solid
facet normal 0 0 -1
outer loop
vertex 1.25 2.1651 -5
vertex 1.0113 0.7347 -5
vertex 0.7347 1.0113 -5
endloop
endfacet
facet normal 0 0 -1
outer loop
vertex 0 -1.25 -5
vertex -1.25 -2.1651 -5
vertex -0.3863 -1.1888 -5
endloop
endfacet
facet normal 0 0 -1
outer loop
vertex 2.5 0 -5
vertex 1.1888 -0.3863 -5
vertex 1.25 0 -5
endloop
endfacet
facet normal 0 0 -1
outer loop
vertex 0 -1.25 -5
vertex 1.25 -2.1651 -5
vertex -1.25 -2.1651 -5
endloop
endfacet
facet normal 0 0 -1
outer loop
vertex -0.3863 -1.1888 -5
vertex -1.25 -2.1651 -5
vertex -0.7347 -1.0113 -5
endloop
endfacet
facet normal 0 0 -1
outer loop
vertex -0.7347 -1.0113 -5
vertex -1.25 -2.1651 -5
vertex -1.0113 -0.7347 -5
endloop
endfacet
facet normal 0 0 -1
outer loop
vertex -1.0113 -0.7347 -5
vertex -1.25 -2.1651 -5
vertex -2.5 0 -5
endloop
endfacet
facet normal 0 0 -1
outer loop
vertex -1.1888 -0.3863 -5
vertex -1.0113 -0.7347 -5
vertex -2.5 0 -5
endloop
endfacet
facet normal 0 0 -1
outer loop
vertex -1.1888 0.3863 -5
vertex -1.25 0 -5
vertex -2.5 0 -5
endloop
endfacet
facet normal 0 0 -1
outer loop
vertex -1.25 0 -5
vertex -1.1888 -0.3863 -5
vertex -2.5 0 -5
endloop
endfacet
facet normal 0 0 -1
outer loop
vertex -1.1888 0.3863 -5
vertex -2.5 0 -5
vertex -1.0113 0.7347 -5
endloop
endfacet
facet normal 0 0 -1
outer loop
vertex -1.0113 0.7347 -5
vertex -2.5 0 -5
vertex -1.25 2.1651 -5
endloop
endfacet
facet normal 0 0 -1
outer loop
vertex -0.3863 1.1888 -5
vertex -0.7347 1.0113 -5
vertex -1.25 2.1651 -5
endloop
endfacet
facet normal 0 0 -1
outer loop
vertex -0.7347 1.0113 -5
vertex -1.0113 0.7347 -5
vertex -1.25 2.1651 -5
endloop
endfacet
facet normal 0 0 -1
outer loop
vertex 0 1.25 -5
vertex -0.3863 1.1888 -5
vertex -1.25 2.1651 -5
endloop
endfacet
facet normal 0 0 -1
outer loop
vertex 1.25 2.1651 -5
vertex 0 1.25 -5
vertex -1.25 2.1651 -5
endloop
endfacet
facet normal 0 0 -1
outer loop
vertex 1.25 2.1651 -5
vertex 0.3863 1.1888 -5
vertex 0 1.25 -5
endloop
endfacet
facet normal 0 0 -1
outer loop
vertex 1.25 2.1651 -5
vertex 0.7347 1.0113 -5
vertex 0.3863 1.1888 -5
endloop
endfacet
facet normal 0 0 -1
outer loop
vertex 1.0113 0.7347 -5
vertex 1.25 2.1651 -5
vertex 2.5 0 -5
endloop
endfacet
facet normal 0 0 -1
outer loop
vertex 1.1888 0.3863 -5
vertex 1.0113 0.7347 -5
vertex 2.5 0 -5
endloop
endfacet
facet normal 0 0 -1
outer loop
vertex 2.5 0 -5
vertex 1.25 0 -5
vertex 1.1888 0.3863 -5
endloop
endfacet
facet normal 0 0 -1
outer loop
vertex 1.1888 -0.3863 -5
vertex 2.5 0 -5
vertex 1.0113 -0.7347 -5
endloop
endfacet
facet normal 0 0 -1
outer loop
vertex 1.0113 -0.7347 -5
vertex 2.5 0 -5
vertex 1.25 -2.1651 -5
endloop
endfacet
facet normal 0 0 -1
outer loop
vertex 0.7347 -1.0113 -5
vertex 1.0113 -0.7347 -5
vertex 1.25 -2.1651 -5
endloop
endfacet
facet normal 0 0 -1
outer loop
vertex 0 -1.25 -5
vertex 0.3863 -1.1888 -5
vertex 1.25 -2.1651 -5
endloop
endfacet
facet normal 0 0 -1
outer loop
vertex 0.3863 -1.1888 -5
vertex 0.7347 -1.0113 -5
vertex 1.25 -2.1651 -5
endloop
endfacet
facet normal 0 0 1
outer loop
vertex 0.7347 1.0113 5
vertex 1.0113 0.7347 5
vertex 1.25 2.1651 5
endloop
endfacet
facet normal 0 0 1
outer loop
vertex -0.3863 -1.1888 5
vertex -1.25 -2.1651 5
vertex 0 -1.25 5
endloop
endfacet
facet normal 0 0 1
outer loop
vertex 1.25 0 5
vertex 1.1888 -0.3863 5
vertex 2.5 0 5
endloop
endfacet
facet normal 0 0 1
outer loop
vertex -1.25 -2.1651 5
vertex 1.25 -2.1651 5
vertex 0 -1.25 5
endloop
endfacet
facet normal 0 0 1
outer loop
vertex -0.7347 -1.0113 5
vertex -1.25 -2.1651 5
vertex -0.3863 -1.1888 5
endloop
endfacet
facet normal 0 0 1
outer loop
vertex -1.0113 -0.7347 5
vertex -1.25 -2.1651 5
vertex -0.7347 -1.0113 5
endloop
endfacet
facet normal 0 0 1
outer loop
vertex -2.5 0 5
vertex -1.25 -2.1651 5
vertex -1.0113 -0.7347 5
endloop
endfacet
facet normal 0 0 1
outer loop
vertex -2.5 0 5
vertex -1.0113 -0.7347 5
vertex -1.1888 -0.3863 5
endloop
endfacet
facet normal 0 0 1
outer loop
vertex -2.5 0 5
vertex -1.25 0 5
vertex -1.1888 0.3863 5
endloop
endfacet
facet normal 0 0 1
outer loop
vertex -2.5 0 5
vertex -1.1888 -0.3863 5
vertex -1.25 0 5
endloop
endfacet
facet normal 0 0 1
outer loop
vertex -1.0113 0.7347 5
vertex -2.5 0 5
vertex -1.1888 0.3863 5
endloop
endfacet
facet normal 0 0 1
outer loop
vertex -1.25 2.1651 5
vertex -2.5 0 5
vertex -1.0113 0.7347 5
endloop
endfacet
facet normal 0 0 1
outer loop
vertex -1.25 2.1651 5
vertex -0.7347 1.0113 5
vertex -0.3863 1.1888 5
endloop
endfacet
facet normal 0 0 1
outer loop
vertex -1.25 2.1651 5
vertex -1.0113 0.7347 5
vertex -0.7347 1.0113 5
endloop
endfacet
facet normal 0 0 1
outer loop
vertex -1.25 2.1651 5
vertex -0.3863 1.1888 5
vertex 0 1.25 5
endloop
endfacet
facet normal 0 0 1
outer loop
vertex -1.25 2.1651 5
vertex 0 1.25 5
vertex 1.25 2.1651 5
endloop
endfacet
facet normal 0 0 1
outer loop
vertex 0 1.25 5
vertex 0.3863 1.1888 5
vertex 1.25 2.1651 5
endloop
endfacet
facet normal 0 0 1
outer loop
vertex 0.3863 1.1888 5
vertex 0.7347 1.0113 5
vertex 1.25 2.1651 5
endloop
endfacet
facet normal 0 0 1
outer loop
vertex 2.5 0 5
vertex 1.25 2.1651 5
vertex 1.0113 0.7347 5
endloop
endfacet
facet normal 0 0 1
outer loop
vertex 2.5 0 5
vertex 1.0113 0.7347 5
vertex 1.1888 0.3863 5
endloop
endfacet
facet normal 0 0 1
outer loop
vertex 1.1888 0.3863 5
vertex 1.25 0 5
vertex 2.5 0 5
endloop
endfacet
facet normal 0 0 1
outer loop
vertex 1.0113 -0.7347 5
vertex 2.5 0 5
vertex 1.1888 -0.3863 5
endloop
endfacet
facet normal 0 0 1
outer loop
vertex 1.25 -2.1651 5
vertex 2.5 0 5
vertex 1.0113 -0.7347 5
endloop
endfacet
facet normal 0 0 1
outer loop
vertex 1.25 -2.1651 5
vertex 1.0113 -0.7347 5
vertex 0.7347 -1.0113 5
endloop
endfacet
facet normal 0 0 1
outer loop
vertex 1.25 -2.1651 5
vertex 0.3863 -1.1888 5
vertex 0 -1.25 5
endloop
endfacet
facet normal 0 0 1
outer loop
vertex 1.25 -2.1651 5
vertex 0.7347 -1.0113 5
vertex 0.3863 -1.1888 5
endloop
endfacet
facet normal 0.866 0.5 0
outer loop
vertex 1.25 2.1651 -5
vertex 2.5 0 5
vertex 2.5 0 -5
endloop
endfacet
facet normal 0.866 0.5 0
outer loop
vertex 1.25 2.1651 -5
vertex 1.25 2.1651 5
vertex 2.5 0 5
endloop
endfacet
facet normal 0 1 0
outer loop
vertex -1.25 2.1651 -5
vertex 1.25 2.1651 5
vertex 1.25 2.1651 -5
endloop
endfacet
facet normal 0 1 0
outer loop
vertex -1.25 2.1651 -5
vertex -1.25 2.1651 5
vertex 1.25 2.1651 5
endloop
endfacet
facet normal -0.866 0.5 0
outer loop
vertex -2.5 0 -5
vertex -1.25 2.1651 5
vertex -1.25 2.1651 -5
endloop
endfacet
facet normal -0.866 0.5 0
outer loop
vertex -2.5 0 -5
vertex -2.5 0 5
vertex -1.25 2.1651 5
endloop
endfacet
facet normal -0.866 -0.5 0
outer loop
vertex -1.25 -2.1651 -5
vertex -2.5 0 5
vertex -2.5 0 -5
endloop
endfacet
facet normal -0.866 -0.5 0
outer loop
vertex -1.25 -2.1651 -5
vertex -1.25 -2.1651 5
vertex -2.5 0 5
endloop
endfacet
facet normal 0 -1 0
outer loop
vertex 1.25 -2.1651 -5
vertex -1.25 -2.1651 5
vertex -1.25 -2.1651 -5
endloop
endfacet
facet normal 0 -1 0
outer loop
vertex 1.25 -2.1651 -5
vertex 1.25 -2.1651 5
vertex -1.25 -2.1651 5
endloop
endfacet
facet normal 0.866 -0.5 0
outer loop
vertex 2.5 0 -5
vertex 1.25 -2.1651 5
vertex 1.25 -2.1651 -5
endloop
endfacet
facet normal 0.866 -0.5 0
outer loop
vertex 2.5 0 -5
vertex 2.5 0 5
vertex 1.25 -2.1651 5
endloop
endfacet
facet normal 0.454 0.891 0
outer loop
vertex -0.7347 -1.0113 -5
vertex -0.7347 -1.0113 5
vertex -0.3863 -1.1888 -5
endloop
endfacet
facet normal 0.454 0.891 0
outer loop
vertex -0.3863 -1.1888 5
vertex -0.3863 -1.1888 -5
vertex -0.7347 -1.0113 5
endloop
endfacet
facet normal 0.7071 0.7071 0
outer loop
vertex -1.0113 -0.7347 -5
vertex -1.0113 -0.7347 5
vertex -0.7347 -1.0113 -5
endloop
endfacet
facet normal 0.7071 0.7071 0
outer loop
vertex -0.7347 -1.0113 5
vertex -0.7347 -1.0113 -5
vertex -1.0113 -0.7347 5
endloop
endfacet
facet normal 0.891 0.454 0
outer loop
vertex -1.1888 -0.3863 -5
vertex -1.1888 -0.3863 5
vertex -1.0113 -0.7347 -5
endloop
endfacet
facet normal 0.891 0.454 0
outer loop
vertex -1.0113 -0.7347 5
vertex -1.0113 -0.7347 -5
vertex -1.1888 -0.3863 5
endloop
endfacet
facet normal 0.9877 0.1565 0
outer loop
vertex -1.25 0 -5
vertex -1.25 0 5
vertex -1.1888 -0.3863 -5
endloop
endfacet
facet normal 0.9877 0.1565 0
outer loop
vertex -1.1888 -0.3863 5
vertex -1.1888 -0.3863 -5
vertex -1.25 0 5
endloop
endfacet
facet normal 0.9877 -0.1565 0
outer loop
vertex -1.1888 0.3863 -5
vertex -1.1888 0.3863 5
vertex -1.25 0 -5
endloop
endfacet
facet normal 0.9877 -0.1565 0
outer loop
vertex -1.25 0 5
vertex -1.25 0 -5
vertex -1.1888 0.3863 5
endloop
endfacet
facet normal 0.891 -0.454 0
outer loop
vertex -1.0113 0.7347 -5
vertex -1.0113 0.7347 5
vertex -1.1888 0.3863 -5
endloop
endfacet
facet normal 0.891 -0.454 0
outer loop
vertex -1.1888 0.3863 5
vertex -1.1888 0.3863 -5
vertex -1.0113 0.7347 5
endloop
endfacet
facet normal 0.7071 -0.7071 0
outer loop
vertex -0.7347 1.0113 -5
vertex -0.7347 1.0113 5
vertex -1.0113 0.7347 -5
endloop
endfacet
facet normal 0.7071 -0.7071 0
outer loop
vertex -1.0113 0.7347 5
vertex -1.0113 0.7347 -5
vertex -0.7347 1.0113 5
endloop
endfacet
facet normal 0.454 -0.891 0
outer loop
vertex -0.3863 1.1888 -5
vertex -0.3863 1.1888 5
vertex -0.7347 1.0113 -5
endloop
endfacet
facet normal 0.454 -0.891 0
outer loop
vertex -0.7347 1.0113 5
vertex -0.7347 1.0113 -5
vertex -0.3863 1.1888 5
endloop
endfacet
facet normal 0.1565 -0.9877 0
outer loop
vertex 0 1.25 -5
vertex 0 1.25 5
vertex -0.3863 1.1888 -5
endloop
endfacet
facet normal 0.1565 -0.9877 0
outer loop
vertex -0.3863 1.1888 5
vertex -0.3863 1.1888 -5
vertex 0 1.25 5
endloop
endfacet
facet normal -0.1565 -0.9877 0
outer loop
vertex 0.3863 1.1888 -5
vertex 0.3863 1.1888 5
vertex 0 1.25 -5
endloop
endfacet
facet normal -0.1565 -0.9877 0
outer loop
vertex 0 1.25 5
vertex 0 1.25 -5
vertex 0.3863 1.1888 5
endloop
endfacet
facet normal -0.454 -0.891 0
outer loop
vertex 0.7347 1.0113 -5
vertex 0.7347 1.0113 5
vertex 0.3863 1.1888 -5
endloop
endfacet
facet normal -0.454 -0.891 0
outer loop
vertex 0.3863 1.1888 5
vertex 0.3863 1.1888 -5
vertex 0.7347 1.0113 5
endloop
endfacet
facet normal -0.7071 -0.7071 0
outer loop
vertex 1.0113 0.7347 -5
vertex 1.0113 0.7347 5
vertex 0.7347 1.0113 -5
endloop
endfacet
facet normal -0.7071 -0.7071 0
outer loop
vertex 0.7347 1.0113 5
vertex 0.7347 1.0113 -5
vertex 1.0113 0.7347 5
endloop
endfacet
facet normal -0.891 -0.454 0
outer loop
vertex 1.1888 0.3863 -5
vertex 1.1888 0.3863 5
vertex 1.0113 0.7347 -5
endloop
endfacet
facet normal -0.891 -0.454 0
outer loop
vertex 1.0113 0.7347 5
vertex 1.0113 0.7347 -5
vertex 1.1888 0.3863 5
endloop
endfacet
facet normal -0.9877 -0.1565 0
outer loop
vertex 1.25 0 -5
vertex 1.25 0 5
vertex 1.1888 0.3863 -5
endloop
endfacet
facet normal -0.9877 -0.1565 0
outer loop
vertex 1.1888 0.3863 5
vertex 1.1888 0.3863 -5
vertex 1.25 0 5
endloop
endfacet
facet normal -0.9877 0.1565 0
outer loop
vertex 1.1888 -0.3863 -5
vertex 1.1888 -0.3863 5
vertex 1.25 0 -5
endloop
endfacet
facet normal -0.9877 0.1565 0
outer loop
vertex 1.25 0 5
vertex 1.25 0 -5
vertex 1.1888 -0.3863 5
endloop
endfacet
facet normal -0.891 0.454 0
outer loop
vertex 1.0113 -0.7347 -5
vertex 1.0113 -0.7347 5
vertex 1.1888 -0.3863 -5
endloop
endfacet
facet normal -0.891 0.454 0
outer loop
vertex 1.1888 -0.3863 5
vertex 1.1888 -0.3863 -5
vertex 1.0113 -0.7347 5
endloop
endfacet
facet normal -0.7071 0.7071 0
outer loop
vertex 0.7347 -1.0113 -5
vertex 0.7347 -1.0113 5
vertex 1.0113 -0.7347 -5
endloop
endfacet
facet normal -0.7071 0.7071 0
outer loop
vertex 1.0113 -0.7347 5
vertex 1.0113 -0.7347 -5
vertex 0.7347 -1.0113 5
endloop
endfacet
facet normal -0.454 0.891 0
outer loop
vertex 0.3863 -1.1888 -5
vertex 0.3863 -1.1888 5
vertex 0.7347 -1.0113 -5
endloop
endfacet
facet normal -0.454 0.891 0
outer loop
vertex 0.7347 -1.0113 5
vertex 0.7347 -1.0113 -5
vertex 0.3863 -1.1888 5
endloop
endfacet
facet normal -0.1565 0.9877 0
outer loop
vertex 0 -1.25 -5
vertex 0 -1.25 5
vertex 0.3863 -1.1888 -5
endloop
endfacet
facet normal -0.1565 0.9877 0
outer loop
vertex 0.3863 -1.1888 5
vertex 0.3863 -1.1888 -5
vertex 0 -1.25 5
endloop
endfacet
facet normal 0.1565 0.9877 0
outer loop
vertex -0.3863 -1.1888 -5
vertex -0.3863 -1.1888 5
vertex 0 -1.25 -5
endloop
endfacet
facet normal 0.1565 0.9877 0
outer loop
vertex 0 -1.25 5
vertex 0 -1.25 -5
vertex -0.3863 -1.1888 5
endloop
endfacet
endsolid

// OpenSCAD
module distance()
{
    color("Silver")linear_extrude(height=10, center=true) 
    {
        difference()
        {
            circle(r=2.5,$fn=6);
            echo("maybe other r?");
            circle(r=1.25,$fn=20);
        }
    }
}

distance();
